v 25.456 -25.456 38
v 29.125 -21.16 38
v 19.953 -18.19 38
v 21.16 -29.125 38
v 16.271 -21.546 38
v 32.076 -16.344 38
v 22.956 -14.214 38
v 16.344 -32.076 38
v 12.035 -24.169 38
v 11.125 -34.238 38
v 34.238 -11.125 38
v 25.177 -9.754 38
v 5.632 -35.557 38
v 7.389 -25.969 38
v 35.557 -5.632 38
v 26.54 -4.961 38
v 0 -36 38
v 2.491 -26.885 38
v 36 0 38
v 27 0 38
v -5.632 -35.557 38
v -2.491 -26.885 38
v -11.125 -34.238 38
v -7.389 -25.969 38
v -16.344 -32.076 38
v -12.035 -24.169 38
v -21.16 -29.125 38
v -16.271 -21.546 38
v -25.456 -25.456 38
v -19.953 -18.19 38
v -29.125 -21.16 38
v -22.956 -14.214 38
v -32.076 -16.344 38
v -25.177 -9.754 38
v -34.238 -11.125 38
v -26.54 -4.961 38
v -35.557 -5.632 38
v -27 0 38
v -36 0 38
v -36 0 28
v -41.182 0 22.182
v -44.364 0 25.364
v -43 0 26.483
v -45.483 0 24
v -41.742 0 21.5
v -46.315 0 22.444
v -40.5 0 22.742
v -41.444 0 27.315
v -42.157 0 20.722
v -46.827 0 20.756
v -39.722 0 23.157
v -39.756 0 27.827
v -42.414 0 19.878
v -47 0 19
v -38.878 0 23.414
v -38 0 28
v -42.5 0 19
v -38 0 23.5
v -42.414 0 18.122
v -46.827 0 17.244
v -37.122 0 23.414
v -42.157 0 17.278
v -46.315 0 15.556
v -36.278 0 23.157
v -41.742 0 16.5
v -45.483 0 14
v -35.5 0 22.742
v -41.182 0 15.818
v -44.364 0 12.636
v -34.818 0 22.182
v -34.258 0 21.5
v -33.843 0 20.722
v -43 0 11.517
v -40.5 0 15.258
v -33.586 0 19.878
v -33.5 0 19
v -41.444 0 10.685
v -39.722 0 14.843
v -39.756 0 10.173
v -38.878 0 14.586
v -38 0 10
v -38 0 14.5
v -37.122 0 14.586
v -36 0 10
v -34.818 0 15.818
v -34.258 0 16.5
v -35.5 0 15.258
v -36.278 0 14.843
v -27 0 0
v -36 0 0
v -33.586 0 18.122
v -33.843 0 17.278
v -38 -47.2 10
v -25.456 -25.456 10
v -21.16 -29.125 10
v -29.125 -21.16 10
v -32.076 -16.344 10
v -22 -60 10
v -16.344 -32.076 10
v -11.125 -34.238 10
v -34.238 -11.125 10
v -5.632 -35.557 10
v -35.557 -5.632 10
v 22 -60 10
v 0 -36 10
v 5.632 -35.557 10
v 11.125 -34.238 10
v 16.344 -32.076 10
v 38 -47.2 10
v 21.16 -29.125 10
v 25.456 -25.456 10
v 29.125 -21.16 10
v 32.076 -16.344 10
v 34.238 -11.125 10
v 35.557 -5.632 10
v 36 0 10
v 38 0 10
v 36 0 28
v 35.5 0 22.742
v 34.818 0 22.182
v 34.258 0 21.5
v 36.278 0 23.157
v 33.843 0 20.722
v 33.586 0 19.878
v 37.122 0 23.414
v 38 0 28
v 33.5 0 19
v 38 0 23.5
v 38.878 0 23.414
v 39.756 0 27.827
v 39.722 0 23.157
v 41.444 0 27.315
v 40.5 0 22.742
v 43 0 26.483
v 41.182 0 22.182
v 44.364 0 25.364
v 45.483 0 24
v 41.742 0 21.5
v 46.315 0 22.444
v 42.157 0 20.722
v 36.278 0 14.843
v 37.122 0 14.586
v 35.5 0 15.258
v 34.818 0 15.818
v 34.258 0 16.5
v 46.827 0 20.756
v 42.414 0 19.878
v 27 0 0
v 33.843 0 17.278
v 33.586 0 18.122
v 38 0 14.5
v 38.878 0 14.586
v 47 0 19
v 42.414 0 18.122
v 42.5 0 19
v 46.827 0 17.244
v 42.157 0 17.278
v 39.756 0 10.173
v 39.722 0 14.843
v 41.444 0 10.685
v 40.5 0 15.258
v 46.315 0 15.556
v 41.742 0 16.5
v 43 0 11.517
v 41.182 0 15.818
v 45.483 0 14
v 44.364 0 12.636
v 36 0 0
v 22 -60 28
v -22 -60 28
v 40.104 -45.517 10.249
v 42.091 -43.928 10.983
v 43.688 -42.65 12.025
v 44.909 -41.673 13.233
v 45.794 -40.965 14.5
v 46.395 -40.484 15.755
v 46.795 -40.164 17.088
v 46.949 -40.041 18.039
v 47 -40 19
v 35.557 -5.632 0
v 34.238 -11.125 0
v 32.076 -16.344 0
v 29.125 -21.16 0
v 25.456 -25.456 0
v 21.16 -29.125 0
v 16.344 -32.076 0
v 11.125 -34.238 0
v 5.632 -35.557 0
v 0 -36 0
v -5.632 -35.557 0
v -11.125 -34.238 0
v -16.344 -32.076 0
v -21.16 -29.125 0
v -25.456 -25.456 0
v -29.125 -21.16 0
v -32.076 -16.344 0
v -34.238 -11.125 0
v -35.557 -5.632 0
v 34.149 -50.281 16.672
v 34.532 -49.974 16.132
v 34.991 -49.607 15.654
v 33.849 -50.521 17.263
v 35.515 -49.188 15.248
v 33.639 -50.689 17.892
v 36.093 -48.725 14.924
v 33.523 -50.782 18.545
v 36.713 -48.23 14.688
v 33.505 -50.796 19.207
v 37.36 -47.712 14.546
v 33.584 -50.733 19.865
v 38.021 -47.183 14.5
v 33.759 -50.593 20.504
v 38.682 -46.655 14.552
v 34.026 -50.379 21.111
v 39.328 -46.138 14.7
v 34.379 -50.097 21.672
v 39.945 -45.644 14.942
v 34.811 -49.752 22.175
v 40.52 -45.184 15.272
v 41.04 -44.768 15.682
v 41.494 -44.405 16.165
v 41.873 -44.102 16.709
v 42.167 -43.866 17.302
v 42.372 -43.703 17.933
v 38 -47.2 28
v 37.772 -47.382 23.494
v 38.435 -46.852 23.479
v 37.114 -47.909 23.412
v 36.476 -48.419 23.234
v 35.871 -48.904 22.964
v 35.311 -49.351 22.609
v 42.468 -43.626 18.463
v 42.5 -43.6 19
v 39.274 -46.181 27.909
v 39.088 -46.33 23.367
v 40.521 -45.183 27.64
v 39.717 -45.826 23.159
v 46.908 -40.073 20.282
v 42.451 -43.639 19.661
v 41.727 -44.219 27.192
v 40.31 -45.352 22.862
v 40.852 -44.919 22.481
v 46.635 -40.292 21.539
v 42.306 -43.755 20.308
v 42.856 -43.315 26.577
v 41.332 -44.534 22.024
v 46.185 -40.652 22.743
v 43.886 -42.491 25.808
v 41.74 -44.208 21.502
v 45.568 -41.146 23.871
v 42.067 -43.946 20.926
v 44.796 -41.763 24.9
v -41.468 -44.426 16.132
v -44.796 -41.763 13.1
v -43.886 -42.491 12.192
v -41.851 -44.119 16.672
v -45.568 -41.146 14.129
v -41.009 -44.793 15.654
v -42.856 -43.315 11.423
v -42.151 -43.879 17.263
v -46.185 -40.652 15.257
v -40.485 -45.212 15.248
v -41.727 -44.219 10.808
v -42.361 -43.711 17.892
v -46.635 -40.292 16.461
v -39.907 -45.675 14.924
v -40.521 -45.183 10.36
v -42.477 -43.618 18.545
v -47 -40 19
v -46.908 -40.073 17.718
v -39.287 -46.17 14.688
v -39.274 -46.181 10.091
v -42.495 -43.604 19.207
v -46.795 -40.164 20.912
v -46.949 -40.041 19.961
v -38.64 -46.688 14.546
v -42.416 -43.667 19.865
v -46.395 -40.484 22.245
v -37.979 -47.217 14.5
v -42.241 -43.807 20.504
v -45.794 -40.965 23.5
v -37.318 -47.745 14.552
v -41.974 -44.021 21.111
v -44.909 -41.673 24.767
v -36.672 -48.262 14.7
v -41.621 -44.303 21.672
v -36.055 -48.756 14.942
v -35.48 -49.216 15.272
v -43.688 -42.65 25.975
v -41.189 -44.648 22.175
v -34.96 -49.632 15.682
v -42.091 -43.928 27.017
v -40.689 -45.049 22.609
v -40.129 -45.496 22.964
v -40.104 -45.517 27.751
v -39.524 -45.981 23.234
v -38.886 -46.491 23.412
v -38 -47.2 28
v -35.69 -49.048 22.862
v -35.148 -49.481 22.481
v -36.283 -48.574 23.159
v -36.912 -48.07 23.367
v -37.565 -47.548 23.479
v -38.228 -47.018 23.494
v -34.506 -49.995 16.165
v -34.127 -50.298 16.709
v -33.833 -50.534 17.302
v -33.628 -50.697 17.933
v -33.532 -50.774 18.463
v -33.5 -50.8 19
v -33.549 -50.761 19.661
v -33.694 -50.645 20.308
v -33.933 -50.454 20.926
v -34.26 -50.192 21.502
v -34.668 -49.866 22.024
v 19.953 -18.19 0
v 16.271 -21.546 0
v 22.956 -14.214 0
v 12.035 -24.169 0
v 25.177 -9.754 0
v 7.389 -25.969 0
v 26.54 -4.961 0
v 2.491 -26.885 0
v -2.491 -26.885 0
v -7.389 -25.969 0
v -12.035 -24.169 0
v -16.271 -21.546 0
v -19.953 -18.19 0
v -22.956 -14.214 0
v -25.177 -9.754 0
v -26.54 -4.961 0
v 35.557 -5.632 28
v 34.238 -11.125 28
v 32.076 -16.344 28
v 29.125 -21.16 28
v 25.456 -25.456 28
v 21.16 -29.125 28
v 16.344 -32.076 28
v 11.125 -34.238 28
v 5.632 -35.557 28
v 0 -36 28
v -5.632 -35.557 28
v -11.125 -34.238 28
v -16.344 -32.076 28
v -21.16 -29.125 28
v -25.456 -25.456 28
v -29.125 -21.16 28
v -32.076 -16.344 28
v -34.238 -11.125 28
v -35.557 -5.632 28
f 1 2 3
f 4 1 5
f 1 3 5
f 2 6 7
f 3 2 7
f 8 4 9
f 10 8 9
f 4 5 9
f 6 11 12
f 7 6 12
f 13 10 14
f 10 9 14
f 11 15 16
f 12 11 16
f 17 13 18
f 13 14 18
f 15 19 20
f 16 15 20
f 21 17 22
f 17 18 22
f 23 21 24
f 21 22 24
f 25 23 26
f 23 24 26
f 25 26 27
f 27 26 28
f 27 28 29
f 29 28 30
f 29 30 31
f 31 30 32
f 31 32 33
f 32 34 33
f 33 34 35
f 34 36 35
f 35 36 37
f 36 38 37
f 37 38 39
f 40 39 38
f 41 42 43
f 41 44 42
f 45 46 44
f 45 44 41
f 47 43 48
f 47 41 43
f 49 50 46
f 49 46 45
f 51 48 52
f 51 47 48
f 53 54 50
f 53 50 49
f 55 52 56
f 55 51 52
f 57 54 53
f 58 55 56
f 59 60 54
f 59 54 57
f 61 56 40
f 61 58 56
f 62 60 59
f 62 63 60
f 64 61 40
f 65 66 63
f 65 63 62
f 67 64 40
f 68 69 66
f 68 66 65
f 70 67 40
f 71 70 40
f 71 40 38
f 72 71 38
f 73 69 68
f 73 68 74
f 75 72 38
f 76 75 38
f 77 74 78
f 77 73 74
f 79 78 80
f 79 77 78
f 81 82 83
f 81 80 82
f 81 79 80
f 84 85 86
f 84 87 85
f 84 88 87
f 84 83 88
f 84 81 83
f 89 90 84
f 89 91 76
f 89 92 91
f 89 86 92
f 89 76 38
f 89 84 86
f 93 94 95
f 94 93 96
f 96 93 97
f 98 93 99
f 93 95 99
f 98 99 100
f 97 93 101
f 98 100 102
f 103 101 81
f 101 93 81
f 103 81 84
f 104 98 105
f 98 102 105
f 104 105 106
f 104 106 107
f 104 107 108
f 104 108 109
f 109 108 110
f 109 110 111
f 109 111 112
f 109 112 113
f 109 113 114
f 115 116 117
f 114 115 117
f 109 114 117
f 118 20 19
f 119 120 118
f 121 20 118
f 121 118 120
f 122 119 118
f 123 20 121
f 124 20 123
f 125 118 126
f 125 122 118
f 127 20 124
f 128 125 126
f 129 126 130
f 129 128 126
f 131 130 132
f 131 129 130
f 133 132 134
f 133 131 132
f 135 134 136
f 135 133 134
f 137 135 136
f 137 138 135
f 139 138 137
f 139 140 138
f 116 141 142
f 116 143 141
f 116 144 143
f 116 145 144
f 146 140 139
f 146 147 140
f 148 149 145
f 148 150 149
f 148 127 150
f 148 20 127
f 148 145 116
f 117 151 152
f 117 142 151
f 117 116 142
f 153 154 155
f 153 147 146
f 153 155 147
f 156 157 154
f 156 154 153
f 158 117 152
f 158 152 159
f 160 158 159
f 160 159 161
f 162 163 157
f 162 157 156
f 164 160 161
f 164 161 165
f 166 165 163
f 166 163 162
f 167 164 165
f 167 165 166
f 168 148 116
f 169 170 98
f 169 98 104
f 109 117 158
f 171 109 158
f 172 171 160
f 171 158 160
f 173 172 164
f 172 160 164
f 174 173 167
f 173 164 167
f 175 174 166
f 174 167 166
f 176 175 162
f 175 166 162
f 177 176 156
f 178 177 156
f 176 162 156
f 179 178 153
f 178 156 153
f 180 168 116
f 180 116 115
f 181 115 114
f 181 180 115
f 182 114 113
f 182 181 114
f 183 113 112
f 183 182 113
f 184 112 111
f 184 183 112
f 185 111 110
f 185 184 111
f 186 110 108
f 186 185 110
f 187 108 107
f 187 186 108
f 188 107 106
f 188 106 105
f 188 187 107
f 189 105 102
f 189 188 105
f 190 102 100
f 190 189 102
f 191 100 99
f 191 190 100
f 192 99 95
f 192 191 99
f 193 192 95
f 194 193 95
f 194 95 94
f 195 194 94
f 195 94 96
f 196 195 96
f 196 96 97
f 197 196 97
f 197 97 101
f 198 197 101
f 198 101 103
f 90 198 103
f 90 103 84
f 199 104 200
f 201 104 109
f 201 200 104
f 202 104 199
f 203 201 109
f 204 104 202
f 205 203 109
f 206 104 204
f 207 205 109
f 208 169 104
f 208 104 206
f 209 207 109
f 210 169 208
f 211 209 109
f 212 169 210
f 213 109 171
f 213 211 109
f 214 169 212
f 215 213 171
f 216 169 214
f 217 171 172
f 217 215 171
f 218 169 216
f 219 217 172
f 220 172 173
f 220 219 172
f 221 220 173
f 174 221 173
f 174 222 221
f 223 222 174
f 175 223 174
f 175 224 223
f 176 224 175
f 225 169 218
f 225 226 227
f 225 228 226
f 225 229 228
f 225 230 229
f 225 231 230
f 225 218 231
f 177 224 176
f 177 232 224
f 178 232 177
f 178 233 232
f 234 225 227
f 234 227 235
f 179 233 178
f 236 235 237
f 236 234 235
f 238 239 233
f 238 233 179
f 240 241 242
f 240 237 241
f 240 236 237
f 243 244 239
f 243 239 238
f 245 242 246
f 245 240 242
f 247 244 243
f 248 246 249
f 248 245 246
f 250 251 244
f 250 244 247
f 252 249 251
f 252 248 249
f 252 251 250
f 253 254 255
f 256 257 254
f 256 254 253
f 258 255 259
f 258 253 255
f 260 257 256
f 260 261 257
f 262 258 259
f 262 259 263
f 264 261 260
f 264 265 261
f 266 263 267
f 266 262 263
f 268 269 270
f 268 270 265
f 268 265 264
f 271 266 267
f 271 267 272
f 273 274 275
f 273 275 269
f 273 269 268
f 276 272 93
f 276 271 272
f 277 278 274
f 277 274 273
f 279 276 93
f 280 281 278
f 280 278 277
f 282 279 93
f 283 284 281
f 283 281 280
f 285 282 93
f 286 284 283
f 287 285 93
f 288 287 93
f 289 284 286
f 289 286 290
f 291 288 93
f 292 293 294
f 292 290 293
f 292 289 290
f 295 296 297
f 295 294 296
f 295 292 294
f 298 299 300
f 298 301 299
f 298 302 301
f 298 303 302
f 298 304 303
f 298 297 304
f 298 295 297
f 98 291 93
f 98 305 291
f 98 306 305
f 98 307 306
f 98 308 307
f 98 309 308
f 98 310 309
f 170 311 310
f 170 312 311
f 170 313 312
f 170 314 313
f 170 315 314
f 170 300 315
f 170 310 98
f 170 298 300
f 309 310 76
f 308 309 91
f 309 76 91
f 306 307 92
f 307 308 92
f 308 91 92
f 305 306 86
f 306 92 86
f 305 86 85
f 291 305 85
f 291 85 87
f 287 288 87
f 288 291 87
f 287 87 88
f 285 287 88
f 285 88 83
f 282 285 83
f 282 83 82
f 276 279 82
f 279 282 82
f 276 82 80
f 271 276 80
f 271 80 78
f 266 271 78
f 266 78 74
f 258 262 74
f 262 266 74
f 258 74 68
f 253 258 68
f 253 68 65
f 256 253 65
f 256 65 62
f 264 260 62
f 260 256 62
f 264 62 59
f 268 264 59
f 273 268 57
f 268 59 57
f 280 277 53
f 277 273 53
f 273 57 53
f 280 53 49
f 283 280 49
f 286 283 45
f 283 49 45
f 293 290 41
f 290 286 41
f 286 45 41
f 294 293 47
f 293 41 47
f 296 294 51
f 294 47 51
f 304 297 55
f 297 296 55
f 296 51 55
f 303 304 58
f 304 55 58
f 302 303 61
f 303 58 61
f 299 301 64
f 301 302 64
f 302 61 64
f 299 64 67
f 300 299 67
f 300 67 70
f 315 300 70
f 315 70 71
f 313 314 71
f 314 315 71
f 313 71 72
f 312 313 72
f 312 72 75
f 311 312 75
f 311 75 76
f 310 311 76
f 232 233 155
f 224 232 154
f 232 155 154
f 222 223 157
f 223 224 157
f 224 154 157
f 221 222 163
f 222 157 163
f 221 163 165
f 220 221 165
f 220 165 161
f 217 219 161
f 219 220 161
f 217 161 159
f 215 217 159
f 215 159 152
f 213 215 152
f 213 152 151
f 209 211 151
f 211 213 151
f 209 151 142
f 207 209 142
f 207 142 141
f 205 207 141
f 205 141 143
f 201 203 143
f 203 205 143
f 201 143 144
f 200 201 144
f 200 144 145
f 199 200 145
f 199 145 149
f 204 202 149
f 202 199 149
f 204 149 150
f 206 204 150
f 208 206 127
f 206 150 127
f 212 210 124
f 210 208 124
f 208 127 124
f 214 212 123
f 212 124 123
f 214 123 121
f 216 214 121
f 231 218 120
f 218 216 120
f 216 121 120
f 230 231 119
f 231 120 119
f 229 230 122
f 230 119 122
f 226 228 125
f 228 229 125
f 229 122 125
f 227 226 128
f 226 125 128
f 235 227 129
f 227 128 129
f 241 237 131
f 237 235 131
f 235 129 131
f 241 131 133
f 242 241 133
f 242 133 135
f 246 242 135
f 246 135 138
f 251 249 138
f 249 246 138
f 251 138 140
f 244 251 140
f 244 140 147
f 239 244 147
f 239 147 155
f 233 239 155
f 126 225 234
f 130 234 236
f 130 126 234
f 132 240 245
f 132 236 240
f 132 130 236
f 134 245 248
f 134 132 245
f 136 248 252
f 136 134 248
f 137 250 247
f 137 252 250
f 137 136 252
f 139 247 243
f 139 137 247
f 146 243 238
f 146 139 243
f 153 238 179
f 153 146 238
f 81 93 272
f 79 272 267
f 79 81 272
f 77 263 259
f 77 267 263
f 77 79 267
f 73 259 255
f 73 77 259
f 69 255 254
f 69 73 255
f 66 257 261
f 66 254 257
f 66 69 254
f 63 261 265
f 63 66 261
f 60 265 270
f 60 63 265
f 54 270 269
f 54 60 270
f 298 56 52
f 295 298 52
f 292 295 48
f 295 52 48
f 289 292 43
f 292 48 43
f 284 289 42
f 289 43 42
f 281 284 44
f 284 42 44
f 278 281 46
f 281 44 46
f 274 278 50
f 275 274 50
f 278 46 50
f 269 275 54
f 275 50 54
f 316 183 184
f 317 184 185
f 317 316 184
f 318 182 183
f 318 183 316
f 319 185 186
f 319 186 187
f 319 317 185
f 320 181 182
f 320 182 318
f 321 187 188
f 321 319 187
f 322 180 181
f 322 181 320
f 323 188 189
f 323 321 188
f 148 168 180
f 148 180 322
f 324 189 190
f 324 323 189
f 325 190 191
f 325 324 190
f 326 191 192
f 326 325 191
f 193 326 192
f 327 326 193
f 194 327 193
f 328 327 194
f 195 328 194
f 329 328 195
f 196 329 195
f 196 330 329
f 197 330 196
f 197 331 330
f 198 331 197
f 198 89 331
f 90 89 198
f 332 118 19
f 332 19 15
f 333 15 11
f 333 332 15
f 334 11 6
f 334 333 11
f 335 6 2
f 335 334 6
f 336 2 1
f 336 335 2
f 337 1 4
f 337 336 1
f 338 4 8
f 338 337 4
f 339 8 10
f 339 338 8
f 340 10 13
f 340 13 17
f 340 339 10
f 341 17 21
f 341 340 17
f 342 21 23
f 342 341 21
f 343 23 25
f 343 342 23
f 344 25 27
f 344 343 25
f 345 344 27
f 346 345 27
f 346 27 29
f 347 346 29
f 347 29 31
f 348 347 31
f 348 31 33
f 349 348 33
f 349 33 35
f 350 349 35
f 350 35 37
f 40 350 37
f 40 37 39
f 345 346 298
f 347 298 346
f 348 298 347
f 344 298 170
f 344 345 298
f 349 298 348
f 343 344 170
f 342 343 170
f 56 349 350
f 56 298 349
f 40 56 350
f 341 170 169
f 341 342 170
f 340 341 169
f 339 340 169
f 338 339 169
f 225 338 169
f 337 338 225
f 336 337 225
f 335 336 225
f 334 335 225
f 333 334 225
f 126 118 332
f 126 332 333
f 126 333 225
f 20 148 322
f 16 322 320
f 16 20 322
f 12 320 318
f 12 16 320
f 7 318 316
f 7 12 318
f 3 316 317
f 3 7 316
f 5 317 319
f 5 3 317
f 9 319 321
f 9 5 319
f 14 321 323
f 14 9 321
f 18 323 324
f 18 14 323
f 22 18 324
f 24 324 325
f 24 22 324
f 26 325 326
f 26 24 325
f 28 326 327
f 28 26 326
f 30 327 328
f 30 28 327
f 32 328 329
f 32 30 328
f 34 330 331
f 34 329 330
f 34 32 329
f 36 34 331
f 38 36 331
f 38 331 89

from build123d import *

# Parameters (mm, degrees)
BOSS_EXTRUDE2_DEPTH  = 38
BOSS_EXTRUDE3_DEPTH  = 9
SKETCH5_R            = 9
BOSS_EXTRUDE4_DEPTH  = 40
CUT_EXTRUDE1_DEPTH   = 61
MIRROR2_COPY_1_DEPTH = 61
CUT_EXTRUDE3_DEPTH   = 40
SKETCH7_R            = 4.5
CUT_EXTRUDE4_DEPTH   = 61


with BuildPart() as part:
    # Sketch1 → Boss-Extrude2 (new body)
    with BuildSketch(Plane.XY):
        with BuildLine():
            Line((27, 0), (36, 0))
            ThreePointArc((36, 0), (0, -36), (-36, 0))
            Line((-36, 0), (-27, 0))
            Line((-27, 0), (27, 0))
        make_face()
    extrude(amount=BOSS_EXTRUDE2_DEPTH)

    # Sketch4 → Boss-Extrude3 (add, symmetric)
    with BuildSketch(Plane.XY.offset(19)):
        with BuildLine():
            Line((-36, 0), (-47, 0))
            Line((-47, 0), (-47, -40))
            Line((-47, -40), (-22, -60))
            Line((-22, -60), (22, -60))
            Line((22, -60), (47, -40))
            Line((47, -40), (47, 0))
            Line((47, 0), (36, 0))
            ThreePointArc((36, 0), (0, -36), (-36, 0))
        make_face()
    extrude(amount=BOSS_EXTRUDE3_DEPTH, both=True)

    # Sketch5 → Boss-Extrude4 (add)
    with BuildSketch(Plane(origin=(0, 0, 0), x_dir=(1, 0, 0), z_dir=(0, 1, 0))):
        with Locations((-38, -19)):
            Circle(SKETCH5_R)
        with Locations((38, -19)):
            Circle(SKETCH5_R)
    extrude(amount=-BOSS_EXTRUDE4_DEPTH)

    # Sketch6 → Cut-Extrude1 (cut, through all)
    with BuildSketch(Plane(origin=(0, 0, 0), x_dir=(1, 0, 0), z_dir=(0, 1, 0))):
        with BuildLine():
            Line((-47, -19), (-47, -10))
            Line((-47, -10), (-38, -10))
            ThreePointArc((-38, -10), (-44.363961031, -12.636038969), (-47, -19))
        make_face()
    cut_extrude1 = extrude(amount=-CUT_EXTRUDE1_DEPTH, mode=Mode.SUBTRACT)

    # Mirror1: Cut-Extrude1 across plane
    add(cut_extrude1.mirror(Plane.XY.offset(19)), mode=Mode.SUBTRACT)

    # Mirror2: Cut-Extrude1 across plane
    add(cut_extrude1.mirror(Plane(origin=(0, 0, 0), x_dir=(0, 0, 1), z_dir=(1, 0, 0))), mode=Mode.SUBTRACT)

    # Mirror2 copy 1 sketch → Mirror2 copy 1 (cut, through all)
    with BuildSketch(Plane(origin=(0, 0, 38), x_dir=(-1, 0, 0), z_dir=(0, 1, 0))):
        with BuildLine():
            Line((-47, -19), (-47, -10))
            Line((-47, -10), (-38, -10))
            ThreePointArc((-38, -10), (-44.363961031, -12.636038969), (-47, -19))
        make_face()
    extrude(amount=-MIRROR2_COPY_1_DEPTH, mode=Mode.SUBTRACT)

    # Sketch3 → Cut-Extrude3 (cut)
    with BuildSketch(Plane.XY.offset(38)):
        with BuildLine():
            Line((-27, 0), (27, 0))
            ThreePointArc((27, 0), (0, -27), (-27, 0))
        make_face()
    extrude(amount=-CUT_EXTRUDE3_DEPTH, mode=Mode.SUBTRACT)

    # Sketch7 → Cut-Extrude4 (cut, through all)
    with BuildSketch(Plane(origin=(0, 0, 0), x_dir=(1, 0, 0), z_dir=(0, 1, 0))):
        with Locations((-38, -19)):
            Circle(SKETCH7_R)
        with Locations((38, -19)):
            Circle(SKETCH7_R)
    extrude(amount=-CUT_EXTRUDE4_DEPTH, mode=Mode.SUBTRACT)


solid = part.part
